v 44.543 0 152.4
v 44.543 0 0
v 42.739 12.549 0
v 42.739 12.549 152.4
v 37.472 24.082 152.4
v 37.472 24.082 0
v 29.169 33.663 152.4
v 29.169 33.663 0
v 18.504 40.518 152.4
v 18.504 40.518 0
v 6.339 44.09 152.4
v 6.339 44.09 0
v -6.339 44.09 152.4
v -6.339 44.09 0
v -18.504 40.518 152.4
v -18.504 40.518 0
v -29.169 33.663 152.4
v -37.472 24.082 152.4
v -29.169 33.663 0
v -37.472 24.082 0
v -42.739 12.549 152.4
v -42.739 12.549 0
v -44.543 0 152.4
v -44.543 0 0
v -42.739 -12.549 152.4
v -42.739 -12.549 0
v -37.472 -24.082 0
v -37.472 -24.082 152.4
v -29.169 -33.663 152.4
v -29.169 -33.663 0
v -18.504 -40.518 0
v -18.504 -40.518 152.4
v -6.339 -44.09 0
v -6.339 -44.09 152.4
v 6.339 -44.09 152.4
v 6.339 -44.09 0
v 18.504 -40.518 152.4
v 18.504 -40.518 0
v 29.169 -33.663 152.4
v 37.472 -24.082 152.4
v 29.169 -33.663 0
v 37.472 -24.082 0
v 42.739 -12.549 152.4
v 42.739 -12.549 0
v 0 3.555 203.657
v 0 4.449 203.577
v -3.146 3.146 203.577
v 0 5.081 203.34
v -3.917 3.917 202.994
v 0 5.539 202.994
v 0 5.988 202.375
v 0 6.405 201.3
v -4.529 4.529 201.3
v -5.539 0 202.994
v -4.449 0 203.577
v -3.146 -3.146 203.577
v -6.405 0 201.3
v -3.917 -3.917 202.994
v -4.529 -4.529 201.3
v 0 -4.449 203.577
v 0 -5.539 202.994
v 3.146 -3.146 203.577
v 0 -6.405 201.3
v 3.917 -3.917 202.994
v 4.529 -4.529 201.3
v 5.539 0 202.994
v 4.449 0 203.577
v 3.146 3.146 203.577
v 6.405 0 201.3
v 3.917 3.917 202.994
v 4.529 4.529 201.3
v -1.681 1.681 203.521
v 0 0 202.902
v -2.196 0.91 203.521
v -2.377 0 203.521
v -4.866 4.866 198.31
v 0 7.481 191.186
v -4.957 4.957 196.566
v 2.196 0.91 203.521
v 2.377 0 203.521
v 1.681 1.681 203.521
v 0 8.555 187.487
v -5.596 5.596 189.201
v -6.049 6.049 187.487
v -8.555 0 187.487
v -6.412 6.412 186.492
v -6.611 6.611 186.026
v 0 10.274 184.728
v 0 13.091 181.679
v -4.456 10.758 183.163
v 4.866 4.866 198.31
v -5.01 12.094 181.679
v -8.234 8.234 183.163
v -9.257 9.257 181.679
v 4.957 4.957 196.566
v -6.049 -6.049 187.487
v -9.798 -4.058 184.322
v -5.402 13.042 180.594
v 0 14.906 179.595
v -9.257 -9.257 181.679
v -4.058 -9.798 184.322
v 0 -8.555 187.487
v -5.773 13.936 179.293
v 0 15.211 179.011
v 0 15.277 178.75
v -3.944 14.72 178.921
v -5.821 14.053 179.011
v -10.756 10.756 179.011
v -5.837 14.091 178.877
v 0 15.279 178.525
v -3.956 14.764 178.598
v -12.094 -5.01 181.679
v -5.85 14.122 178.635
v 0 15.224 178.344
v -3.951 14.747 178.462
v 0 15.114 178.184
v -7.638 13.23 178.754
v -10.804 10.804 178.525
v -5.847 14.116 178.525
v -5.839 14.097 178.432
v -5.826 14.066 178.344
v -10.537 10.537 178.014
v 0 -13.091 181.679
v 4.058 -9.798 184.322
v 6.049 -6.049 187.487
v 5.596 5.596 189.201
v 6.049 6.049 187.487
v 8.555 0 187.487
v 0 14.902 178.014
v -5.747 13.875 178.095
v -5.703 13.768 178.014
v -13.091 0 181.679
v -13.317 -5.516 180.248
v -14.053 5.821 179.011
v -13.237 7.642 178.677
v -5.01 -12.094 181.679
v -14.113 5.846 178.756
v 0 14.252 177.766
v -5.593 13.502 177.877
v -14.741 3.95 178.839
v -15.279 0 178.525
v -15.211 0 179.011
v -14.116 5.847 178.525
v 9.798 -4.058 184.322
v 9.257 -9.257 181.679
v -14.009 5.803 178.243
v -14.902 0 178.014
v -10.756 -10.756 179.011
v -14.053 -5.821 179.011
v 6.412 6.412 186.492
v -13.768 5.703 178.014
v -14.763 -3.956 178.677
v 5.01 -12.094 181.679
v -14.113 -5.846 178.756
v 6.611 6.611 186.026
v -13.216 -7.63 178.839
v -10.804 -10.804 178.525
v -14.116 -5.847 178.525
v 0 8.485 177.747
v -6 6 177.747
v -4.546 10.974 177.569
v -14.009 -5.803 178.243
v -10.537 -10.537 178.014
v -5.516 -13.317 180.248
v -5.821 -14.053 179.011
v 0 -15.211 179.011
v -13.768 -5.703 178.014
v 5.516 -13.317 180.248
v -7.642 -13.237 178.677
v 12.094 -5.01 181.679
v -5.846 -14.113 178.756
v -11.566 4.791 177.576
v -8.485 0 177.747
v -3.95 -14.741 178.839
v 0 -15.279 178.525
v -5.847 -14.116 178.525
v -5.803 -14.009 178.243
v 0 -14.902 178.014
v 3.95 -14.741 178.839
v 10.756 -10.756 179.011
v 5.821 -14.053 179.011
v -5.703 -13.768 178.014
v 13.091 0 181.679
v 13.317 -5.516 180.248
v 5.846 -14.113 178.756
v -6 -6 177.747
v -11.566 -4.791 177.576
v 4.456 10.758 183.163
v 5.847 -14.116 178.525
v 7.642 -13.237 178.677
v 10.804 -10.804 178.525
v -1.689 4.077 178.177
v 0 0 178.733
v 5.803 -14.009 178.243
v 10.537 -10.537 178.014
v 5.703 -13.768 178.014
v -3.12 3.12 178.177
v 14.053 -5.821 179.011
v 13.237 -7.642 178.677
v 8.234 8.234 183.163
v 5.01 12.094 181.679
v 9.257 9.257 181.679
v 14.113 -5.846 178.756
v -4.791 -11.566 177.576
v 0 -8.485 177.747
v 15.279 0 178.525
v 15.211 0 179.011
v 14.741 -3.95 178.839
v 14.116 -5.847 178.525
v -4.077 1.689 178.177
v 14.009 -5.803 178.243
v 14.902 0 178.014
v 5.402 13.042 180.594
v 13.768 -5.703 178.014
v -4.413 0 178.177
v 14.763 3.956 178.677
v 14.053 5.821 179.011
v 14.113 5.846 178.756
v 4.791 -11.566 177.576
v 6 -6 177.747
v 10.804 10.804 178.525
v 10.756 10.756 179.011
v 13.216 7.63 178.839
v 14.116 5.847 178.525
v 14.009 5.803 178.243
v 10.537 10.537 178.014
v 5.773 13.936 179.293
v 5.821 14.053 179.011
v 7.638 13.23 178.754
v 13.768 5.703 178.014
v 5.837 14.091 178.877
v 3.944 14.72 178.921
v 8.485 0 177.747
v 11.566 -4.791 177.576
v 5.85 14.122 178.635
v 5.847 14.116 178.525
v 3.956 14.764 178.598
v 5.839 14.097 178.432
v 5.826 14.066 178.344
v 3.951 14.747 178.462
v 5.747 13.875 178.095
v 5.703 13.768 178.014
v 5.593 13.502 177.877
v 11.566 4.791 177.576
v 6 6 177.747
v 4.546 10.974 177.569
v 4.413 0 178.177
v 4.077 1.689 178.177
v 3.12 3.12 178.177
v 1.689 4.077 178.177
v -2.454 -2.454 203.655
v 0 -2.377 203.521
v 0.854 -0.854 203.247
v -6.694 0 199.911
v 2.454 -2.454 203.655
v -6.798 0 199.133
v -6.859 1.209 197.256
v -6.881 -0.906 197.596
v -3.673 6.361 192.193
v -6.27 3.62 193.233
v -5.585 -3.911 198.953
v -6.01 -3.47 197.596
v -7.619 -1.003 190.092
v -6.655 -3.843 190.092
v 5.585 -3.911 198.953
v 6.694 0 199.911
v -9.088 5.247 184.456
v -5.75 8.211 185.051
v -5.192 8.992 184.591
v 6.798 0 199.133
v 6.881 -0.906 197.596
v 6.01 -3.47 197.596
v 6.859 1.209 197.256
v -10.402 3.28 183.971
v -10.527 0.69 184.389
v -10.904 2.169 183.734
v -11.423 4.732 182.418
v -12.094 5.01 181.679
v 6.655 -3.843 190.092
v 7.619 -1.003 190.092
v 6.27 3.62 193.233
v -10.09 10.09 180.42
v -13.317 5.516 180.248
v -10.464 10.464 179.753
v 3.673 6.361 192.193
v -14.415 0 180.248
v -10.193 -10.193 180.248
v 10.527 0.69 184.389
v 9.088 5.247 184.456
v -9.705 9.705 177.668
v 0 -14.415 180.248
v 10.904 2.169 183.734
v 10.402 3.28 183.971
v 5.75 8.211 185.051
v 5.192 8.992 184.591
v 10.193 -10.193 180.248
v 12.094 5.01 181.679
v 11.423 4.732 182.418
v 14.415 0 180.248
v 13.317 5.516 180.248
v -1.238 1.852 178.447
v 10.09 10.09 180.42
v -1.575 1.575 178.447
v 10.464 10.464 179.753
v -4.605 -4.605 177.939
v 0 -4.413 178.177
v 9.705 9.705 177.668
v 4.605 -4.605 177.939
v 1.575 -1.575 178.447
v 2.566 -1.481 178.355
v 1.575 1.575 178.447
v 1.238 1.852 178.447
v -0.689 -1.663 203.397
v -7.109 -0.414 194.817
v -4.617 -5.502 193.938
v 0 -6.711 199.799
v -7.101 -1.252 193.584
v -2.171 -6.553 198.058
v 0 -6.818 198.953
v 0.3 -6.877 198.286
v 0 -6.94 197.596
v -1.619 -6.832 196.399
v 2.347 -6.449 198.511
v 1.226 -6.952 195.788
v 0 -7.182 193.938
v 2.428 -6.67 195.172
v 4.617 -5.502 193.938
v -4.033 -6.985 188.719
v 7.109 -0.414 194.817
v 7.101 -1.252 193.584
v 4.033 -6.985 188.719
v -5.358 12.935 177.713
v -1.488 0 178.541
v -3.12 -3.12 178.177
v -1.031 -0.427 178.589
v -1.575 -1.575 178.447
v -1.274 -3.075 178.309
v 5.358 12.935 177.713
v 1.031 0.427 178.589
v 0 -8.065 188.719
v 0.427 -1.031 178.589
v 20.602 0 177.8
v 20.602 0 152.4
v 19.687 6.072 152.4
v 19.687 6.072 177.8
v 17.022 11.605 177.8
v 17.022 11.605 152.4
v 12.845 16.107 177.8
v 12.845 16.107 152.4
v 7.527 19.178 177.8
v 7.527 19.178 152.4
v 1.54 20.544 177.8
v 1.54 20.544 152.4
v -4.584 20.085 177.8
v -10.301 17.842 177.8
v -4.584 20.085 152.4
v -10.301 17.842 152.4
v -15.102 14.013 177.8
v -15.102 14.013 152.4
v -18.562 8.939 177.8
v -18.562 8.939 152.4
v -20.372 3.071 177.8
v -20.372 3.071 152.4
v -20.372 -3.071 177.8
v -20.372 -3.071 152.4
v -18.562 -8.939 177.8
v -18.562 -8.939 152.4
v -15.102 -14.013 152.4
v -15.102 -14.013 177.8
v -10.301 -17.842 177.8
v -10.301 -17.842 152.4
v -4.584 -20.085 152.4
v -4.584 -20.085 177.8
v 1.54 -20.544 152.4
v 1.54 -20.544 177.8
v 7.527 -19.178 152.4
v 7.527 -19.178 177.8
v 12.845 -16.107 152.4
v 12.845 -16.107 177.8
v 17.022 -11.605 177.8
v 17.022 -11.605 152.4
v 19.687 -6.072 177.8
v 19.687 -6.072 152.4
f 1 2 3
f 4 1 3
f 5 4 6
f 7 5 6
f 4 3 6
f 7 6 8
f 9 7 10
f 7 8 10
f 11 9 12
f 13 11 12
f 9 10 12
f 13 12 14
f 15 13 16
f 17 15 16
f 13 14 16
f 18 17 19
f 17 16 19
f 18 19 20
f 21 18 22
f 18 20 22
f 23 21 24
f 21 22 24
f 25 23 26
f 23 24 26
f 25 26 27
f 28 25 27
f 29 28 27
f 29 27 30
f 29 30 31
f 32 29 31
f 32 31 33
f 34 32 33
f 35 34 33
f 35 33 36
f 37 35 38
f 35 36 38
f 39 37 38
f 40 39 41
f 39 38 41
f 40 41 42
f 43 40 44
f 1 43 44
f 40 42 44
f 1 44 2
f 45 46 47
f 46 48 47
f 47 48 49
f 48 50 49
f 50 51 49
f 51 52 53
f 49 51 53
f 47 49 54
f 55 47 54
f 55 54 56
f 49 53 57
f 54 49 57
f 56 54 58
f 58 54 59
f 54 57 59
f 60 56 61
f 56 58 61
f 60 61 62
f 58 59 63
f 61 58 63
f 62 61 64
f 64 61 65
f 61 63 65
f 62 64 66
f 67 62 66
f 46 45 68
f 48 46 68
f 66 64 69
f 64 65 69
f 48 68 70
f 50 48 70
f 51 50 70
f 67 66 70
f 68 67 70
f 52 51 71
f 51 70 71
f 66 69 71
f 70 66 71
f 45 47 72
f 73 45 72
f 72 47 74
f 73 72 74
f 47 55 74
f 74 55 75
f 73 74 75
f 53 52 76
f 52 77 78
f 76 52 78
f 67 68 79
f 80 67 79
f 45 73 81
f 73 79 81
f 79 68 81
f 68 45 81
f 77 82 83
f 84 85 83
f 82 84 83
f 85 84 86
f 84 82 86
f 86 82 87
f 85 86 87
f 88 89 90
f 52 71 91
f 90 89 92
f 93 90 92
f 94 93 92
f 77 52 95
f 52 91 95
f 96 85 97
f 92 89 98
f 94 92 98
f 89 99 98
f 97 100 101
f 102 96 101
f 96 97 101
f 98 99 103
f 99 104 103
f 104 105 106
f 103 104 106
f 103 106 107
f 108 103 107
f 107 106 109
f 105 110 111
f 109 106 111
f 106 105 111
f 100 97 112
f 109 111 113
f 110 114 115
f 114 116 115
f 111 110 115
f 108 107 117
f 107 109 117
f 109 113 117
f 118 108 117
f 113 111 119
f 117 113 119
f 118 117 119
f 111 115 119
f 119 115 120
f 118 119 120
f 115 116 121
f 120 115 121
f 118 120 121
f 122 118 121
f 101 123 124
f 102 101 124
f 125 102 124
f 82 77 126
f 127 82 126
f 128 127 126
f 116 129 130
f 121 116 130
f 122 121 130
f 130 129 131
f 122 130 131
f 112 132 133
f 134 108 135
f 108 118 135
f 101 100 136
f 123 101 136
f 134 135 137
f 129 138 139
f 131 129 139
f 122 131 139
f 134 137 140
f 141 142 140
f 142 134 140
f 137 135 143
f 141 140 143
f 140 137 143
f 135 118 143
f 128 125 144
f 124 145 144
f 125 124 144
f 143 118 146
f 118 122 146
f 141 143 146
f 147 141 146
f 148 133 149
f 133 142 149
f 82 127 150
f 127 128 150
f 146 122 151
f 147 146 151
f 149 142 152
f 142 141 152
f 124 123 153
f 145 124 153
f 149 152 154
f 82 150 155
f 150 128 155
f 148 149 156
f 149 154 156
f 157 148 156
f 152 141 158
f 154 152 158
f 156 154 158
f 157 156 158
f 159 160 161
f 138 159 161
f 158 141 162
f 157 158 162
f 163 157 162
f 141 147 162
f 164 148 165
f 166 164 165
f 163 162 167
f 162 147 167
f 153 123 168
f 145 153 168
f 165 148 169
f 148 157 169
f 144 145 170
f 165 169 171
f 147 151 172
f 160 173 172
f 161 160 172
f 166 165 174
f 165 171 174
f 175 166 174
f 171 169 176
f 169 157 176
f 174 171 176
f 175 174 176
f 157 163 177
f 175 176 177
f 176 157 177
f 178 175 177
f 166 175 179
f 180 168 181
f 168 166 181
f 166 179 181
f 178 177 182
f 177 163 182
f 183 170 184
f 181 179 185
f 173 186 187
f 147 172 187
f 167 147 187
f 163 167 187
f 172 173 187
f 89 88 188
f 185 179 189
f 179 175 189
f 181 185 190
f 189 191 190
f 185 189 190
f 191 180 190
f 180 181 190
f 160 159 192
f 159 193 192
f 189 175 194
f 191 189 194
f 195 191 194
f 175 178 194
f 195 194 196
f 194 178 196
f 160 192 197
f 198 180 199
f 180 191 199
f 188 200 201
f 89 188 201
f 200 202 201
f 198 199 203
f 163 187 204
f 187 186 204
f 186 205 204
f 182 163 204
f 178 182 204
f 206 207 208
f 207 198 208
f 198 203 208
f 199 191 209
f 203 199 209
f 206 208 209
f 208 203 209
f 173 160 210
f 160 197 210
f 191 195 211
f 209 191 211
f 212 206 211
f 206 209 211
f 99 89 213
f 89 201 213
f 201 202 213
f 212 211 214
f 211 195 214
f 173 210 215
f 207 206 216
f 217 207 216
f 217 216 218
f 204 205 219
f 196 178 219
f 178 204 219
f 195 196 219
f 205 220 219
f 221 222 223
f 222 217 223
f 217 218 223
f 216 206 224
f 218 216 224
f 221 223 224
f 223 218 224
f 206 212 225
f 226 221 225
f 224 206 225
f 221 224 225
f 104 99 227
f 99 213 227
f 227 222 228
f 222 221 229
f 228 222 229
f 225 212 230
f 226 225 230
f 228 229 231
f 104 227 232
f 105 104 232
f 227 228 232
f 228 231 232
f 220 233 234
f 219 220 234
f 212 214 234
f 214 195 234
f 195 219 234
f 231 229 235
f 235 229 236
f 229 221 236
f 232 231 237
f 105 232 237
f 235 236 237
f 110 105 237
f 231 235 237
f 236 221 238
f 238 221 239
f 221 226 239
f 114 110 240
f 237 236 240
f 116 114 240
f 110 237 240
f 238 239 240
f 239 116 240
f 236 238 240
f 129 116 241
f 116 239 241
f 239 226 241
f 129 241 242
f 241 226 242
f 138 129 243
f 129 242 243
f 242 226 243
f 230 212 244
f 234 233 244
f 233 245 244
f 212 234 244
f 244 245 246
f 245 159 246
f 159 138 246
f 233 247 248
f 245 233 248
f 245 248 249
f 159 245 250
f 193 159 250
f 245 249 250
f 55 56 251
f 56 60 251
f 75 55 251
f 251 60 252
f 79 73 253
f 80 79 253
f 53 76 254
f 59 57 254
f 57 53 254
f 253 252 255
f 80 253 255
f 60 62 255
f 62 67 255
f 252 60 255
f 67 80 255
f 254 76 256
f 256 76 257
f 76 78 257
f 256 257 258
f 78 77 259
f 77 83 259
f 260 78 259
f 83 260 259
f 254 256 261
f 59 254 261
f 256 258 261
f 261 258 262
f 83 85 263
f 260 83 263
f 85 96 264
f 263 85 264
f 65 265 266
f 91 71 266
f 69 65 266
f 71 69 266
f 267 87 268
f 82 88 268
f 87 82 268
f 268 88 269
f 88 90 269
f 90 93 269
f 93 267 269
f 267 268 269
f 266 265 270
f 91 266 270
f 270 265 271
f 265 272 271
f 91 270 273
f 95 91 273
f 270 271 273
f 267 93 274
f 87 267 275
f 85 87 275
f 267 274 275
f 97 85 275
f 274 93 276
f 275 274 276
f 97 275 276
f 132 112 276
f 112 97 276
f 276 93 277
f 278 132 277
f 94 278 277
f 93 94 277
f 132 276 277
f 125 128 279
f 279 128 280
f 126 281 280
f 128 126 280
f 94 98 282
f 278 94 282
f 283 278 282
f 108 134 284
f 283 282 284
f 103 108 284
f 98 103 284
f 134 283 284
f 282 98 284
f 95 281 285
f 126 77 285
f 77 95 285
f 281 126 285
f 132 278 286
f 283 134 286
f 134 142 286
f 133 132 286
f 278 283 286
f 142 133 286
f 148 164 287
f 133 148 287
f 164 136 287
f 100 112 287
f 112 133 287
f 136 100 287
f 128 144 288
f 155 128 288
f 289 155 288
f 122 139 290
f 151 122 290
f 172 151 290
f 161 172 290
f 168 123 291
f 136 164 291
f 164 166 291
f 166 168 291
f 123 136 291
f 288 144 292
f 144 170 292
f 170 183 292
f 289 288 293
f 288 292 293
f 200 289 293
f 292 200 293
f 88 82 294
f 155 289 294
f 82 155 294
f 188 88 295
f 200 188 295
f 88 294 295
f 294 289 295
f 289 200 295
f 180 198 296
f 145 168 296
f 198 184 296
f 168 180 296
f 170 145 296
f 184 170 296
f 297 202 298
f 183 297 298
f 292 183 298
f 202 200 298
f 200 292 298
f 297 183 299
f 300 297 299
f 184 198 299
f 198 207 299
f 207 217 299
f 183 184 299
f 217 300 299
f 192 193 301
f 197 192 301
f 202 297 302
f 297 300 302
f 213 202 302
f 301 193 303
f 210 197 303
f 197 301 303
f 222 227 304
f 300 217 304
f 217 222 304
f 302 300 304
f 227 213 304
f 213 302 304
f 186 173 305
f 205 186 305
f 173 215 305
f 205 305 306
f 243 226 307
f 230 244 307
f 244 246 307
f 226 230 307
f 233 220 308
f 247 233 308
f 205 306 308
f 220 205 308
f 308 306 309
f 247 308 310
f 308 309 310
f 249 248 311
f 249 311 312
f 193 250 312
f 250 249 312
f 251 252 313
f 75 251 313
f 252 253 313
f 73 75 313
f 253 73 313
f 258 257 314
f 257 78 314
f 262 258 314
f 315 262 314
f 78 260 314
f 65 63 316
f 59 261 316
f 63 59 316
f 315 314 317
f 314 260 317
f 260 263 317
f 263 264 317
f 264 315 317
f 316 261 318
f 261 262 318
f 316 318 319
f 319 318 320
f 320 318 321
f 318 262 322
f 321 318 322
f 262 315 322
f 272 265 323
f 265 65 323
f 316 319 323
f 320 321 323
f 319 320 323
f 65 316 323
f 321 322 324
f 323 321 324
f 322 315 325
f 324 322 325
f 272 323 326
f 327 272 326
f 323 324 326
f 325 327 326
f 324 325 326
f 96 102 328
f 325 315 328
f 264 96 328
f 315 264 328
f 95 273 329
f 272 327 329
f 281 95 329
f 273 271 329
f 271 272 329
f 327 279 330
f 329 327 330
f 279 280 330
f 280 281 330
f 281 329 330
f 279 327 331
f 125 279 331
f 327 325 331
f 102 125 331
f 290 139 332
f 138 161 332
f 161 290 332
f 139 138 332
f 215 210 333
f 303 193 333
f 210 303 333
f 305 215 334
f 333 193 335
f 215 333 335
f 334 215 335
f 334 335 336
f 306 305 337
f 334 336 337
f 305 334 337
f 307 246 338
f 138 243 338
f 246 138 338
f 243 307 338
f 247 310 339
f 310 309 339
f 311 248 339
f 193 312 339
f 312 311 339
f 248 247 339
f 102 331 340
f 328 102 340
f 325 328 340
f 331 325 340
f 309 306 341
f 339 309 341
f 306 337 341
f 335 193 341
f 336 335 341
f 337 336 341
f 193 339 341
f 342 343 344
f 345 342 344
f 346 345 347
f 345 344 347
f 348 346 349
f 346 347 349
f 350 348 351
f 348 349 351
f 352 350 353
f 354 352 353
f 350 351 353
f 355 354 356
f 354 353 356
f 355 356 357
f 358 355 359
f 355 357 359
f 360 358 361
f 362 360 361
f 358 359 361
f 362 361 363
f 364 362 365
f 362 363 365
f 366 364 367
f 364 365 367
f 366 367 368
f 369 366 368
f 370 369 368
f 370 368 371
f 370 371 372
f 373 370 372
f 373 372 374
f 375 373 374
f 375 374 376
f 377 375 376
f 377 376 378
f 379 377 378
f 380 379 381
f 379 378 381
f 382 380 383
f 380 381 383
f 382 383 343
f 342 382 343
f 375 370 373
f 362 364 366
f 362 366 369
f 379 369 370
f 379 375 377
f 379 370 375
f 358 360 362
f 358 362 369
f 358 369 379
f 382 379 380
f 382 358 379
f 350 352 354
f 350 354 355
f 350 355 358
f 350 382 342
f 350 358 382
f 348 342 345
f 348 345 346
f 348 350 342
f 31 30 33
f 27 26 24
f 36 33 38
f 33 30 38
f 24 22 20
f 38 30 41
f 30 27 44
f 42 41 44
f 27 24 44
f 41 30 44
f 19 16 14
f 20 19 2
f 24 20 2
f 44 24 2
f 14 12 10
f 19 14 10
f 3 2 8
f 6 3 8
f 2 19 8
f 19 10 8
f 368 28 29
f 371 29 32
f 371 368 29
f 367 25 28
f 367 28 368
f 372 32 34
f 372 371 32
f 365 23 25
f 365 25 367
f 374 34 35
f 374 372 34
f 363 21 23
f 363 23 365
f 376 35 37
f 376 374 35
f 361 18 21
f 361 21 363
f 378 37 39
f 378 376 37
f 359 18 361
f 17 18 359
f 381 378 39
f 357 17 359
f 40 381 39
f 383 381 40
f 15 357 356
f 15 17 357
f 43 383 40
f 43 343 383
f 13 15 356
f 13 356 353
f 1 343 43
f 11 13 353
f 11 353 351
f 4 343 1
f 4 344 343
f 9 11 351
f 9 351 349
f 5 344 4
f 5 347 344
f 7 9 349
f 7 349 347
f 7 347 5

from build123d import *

# Parameters (mm, degrees)
F0_R     = 44.5429480325
F1_DEPTH = 152.4
F2_R     = 20.6018000869
F3_DEPTH = 25.4


with BuildPart() as f1:
    # F0 (on Top) → F1 (new body)
    with BuildSketch(Plane.XY):
        Circle(F0_R)
    extrude(amount=F1_DEPTH)

    # F2 (on face) → F3 (join)
    with BuildSketch(Plane.XY.offset(152.4)):
        Circle(F2_R)
    extrude(amount=F3_DEPTH)


with BuildPart() as f5:
    # F4 (on Right) → F5 (revolve)
    with BuildSketch(Plane.YZ):
        with BuildLine():
            Line((0, 202.9023468494), (0, 178.7326484919))
            add(Edge.make_bspline(
                [(0, 202.9023468494), (2.2296912111, 203.5570291376), (7.8599163497, 205.2101767385), (6.1222476166, 188.7861749021), (12.0403399977, 182.7350478897), (18.3472904248, 176.3667574668), (7.2112046106, 177.8027605426), (0, 178.7326484919)],
                knots=[0, 0, 0, 0, 0.157355638, 0.3973409701, 0.6003607585, 0.7412124522, 1, 1, 1, 1], degree=3))
        make_face()
    revolve(axis=Axis((0, 0, 190.8174976707), (0, 0, 1)))


solid = Compound([f1.part, f5.part])
